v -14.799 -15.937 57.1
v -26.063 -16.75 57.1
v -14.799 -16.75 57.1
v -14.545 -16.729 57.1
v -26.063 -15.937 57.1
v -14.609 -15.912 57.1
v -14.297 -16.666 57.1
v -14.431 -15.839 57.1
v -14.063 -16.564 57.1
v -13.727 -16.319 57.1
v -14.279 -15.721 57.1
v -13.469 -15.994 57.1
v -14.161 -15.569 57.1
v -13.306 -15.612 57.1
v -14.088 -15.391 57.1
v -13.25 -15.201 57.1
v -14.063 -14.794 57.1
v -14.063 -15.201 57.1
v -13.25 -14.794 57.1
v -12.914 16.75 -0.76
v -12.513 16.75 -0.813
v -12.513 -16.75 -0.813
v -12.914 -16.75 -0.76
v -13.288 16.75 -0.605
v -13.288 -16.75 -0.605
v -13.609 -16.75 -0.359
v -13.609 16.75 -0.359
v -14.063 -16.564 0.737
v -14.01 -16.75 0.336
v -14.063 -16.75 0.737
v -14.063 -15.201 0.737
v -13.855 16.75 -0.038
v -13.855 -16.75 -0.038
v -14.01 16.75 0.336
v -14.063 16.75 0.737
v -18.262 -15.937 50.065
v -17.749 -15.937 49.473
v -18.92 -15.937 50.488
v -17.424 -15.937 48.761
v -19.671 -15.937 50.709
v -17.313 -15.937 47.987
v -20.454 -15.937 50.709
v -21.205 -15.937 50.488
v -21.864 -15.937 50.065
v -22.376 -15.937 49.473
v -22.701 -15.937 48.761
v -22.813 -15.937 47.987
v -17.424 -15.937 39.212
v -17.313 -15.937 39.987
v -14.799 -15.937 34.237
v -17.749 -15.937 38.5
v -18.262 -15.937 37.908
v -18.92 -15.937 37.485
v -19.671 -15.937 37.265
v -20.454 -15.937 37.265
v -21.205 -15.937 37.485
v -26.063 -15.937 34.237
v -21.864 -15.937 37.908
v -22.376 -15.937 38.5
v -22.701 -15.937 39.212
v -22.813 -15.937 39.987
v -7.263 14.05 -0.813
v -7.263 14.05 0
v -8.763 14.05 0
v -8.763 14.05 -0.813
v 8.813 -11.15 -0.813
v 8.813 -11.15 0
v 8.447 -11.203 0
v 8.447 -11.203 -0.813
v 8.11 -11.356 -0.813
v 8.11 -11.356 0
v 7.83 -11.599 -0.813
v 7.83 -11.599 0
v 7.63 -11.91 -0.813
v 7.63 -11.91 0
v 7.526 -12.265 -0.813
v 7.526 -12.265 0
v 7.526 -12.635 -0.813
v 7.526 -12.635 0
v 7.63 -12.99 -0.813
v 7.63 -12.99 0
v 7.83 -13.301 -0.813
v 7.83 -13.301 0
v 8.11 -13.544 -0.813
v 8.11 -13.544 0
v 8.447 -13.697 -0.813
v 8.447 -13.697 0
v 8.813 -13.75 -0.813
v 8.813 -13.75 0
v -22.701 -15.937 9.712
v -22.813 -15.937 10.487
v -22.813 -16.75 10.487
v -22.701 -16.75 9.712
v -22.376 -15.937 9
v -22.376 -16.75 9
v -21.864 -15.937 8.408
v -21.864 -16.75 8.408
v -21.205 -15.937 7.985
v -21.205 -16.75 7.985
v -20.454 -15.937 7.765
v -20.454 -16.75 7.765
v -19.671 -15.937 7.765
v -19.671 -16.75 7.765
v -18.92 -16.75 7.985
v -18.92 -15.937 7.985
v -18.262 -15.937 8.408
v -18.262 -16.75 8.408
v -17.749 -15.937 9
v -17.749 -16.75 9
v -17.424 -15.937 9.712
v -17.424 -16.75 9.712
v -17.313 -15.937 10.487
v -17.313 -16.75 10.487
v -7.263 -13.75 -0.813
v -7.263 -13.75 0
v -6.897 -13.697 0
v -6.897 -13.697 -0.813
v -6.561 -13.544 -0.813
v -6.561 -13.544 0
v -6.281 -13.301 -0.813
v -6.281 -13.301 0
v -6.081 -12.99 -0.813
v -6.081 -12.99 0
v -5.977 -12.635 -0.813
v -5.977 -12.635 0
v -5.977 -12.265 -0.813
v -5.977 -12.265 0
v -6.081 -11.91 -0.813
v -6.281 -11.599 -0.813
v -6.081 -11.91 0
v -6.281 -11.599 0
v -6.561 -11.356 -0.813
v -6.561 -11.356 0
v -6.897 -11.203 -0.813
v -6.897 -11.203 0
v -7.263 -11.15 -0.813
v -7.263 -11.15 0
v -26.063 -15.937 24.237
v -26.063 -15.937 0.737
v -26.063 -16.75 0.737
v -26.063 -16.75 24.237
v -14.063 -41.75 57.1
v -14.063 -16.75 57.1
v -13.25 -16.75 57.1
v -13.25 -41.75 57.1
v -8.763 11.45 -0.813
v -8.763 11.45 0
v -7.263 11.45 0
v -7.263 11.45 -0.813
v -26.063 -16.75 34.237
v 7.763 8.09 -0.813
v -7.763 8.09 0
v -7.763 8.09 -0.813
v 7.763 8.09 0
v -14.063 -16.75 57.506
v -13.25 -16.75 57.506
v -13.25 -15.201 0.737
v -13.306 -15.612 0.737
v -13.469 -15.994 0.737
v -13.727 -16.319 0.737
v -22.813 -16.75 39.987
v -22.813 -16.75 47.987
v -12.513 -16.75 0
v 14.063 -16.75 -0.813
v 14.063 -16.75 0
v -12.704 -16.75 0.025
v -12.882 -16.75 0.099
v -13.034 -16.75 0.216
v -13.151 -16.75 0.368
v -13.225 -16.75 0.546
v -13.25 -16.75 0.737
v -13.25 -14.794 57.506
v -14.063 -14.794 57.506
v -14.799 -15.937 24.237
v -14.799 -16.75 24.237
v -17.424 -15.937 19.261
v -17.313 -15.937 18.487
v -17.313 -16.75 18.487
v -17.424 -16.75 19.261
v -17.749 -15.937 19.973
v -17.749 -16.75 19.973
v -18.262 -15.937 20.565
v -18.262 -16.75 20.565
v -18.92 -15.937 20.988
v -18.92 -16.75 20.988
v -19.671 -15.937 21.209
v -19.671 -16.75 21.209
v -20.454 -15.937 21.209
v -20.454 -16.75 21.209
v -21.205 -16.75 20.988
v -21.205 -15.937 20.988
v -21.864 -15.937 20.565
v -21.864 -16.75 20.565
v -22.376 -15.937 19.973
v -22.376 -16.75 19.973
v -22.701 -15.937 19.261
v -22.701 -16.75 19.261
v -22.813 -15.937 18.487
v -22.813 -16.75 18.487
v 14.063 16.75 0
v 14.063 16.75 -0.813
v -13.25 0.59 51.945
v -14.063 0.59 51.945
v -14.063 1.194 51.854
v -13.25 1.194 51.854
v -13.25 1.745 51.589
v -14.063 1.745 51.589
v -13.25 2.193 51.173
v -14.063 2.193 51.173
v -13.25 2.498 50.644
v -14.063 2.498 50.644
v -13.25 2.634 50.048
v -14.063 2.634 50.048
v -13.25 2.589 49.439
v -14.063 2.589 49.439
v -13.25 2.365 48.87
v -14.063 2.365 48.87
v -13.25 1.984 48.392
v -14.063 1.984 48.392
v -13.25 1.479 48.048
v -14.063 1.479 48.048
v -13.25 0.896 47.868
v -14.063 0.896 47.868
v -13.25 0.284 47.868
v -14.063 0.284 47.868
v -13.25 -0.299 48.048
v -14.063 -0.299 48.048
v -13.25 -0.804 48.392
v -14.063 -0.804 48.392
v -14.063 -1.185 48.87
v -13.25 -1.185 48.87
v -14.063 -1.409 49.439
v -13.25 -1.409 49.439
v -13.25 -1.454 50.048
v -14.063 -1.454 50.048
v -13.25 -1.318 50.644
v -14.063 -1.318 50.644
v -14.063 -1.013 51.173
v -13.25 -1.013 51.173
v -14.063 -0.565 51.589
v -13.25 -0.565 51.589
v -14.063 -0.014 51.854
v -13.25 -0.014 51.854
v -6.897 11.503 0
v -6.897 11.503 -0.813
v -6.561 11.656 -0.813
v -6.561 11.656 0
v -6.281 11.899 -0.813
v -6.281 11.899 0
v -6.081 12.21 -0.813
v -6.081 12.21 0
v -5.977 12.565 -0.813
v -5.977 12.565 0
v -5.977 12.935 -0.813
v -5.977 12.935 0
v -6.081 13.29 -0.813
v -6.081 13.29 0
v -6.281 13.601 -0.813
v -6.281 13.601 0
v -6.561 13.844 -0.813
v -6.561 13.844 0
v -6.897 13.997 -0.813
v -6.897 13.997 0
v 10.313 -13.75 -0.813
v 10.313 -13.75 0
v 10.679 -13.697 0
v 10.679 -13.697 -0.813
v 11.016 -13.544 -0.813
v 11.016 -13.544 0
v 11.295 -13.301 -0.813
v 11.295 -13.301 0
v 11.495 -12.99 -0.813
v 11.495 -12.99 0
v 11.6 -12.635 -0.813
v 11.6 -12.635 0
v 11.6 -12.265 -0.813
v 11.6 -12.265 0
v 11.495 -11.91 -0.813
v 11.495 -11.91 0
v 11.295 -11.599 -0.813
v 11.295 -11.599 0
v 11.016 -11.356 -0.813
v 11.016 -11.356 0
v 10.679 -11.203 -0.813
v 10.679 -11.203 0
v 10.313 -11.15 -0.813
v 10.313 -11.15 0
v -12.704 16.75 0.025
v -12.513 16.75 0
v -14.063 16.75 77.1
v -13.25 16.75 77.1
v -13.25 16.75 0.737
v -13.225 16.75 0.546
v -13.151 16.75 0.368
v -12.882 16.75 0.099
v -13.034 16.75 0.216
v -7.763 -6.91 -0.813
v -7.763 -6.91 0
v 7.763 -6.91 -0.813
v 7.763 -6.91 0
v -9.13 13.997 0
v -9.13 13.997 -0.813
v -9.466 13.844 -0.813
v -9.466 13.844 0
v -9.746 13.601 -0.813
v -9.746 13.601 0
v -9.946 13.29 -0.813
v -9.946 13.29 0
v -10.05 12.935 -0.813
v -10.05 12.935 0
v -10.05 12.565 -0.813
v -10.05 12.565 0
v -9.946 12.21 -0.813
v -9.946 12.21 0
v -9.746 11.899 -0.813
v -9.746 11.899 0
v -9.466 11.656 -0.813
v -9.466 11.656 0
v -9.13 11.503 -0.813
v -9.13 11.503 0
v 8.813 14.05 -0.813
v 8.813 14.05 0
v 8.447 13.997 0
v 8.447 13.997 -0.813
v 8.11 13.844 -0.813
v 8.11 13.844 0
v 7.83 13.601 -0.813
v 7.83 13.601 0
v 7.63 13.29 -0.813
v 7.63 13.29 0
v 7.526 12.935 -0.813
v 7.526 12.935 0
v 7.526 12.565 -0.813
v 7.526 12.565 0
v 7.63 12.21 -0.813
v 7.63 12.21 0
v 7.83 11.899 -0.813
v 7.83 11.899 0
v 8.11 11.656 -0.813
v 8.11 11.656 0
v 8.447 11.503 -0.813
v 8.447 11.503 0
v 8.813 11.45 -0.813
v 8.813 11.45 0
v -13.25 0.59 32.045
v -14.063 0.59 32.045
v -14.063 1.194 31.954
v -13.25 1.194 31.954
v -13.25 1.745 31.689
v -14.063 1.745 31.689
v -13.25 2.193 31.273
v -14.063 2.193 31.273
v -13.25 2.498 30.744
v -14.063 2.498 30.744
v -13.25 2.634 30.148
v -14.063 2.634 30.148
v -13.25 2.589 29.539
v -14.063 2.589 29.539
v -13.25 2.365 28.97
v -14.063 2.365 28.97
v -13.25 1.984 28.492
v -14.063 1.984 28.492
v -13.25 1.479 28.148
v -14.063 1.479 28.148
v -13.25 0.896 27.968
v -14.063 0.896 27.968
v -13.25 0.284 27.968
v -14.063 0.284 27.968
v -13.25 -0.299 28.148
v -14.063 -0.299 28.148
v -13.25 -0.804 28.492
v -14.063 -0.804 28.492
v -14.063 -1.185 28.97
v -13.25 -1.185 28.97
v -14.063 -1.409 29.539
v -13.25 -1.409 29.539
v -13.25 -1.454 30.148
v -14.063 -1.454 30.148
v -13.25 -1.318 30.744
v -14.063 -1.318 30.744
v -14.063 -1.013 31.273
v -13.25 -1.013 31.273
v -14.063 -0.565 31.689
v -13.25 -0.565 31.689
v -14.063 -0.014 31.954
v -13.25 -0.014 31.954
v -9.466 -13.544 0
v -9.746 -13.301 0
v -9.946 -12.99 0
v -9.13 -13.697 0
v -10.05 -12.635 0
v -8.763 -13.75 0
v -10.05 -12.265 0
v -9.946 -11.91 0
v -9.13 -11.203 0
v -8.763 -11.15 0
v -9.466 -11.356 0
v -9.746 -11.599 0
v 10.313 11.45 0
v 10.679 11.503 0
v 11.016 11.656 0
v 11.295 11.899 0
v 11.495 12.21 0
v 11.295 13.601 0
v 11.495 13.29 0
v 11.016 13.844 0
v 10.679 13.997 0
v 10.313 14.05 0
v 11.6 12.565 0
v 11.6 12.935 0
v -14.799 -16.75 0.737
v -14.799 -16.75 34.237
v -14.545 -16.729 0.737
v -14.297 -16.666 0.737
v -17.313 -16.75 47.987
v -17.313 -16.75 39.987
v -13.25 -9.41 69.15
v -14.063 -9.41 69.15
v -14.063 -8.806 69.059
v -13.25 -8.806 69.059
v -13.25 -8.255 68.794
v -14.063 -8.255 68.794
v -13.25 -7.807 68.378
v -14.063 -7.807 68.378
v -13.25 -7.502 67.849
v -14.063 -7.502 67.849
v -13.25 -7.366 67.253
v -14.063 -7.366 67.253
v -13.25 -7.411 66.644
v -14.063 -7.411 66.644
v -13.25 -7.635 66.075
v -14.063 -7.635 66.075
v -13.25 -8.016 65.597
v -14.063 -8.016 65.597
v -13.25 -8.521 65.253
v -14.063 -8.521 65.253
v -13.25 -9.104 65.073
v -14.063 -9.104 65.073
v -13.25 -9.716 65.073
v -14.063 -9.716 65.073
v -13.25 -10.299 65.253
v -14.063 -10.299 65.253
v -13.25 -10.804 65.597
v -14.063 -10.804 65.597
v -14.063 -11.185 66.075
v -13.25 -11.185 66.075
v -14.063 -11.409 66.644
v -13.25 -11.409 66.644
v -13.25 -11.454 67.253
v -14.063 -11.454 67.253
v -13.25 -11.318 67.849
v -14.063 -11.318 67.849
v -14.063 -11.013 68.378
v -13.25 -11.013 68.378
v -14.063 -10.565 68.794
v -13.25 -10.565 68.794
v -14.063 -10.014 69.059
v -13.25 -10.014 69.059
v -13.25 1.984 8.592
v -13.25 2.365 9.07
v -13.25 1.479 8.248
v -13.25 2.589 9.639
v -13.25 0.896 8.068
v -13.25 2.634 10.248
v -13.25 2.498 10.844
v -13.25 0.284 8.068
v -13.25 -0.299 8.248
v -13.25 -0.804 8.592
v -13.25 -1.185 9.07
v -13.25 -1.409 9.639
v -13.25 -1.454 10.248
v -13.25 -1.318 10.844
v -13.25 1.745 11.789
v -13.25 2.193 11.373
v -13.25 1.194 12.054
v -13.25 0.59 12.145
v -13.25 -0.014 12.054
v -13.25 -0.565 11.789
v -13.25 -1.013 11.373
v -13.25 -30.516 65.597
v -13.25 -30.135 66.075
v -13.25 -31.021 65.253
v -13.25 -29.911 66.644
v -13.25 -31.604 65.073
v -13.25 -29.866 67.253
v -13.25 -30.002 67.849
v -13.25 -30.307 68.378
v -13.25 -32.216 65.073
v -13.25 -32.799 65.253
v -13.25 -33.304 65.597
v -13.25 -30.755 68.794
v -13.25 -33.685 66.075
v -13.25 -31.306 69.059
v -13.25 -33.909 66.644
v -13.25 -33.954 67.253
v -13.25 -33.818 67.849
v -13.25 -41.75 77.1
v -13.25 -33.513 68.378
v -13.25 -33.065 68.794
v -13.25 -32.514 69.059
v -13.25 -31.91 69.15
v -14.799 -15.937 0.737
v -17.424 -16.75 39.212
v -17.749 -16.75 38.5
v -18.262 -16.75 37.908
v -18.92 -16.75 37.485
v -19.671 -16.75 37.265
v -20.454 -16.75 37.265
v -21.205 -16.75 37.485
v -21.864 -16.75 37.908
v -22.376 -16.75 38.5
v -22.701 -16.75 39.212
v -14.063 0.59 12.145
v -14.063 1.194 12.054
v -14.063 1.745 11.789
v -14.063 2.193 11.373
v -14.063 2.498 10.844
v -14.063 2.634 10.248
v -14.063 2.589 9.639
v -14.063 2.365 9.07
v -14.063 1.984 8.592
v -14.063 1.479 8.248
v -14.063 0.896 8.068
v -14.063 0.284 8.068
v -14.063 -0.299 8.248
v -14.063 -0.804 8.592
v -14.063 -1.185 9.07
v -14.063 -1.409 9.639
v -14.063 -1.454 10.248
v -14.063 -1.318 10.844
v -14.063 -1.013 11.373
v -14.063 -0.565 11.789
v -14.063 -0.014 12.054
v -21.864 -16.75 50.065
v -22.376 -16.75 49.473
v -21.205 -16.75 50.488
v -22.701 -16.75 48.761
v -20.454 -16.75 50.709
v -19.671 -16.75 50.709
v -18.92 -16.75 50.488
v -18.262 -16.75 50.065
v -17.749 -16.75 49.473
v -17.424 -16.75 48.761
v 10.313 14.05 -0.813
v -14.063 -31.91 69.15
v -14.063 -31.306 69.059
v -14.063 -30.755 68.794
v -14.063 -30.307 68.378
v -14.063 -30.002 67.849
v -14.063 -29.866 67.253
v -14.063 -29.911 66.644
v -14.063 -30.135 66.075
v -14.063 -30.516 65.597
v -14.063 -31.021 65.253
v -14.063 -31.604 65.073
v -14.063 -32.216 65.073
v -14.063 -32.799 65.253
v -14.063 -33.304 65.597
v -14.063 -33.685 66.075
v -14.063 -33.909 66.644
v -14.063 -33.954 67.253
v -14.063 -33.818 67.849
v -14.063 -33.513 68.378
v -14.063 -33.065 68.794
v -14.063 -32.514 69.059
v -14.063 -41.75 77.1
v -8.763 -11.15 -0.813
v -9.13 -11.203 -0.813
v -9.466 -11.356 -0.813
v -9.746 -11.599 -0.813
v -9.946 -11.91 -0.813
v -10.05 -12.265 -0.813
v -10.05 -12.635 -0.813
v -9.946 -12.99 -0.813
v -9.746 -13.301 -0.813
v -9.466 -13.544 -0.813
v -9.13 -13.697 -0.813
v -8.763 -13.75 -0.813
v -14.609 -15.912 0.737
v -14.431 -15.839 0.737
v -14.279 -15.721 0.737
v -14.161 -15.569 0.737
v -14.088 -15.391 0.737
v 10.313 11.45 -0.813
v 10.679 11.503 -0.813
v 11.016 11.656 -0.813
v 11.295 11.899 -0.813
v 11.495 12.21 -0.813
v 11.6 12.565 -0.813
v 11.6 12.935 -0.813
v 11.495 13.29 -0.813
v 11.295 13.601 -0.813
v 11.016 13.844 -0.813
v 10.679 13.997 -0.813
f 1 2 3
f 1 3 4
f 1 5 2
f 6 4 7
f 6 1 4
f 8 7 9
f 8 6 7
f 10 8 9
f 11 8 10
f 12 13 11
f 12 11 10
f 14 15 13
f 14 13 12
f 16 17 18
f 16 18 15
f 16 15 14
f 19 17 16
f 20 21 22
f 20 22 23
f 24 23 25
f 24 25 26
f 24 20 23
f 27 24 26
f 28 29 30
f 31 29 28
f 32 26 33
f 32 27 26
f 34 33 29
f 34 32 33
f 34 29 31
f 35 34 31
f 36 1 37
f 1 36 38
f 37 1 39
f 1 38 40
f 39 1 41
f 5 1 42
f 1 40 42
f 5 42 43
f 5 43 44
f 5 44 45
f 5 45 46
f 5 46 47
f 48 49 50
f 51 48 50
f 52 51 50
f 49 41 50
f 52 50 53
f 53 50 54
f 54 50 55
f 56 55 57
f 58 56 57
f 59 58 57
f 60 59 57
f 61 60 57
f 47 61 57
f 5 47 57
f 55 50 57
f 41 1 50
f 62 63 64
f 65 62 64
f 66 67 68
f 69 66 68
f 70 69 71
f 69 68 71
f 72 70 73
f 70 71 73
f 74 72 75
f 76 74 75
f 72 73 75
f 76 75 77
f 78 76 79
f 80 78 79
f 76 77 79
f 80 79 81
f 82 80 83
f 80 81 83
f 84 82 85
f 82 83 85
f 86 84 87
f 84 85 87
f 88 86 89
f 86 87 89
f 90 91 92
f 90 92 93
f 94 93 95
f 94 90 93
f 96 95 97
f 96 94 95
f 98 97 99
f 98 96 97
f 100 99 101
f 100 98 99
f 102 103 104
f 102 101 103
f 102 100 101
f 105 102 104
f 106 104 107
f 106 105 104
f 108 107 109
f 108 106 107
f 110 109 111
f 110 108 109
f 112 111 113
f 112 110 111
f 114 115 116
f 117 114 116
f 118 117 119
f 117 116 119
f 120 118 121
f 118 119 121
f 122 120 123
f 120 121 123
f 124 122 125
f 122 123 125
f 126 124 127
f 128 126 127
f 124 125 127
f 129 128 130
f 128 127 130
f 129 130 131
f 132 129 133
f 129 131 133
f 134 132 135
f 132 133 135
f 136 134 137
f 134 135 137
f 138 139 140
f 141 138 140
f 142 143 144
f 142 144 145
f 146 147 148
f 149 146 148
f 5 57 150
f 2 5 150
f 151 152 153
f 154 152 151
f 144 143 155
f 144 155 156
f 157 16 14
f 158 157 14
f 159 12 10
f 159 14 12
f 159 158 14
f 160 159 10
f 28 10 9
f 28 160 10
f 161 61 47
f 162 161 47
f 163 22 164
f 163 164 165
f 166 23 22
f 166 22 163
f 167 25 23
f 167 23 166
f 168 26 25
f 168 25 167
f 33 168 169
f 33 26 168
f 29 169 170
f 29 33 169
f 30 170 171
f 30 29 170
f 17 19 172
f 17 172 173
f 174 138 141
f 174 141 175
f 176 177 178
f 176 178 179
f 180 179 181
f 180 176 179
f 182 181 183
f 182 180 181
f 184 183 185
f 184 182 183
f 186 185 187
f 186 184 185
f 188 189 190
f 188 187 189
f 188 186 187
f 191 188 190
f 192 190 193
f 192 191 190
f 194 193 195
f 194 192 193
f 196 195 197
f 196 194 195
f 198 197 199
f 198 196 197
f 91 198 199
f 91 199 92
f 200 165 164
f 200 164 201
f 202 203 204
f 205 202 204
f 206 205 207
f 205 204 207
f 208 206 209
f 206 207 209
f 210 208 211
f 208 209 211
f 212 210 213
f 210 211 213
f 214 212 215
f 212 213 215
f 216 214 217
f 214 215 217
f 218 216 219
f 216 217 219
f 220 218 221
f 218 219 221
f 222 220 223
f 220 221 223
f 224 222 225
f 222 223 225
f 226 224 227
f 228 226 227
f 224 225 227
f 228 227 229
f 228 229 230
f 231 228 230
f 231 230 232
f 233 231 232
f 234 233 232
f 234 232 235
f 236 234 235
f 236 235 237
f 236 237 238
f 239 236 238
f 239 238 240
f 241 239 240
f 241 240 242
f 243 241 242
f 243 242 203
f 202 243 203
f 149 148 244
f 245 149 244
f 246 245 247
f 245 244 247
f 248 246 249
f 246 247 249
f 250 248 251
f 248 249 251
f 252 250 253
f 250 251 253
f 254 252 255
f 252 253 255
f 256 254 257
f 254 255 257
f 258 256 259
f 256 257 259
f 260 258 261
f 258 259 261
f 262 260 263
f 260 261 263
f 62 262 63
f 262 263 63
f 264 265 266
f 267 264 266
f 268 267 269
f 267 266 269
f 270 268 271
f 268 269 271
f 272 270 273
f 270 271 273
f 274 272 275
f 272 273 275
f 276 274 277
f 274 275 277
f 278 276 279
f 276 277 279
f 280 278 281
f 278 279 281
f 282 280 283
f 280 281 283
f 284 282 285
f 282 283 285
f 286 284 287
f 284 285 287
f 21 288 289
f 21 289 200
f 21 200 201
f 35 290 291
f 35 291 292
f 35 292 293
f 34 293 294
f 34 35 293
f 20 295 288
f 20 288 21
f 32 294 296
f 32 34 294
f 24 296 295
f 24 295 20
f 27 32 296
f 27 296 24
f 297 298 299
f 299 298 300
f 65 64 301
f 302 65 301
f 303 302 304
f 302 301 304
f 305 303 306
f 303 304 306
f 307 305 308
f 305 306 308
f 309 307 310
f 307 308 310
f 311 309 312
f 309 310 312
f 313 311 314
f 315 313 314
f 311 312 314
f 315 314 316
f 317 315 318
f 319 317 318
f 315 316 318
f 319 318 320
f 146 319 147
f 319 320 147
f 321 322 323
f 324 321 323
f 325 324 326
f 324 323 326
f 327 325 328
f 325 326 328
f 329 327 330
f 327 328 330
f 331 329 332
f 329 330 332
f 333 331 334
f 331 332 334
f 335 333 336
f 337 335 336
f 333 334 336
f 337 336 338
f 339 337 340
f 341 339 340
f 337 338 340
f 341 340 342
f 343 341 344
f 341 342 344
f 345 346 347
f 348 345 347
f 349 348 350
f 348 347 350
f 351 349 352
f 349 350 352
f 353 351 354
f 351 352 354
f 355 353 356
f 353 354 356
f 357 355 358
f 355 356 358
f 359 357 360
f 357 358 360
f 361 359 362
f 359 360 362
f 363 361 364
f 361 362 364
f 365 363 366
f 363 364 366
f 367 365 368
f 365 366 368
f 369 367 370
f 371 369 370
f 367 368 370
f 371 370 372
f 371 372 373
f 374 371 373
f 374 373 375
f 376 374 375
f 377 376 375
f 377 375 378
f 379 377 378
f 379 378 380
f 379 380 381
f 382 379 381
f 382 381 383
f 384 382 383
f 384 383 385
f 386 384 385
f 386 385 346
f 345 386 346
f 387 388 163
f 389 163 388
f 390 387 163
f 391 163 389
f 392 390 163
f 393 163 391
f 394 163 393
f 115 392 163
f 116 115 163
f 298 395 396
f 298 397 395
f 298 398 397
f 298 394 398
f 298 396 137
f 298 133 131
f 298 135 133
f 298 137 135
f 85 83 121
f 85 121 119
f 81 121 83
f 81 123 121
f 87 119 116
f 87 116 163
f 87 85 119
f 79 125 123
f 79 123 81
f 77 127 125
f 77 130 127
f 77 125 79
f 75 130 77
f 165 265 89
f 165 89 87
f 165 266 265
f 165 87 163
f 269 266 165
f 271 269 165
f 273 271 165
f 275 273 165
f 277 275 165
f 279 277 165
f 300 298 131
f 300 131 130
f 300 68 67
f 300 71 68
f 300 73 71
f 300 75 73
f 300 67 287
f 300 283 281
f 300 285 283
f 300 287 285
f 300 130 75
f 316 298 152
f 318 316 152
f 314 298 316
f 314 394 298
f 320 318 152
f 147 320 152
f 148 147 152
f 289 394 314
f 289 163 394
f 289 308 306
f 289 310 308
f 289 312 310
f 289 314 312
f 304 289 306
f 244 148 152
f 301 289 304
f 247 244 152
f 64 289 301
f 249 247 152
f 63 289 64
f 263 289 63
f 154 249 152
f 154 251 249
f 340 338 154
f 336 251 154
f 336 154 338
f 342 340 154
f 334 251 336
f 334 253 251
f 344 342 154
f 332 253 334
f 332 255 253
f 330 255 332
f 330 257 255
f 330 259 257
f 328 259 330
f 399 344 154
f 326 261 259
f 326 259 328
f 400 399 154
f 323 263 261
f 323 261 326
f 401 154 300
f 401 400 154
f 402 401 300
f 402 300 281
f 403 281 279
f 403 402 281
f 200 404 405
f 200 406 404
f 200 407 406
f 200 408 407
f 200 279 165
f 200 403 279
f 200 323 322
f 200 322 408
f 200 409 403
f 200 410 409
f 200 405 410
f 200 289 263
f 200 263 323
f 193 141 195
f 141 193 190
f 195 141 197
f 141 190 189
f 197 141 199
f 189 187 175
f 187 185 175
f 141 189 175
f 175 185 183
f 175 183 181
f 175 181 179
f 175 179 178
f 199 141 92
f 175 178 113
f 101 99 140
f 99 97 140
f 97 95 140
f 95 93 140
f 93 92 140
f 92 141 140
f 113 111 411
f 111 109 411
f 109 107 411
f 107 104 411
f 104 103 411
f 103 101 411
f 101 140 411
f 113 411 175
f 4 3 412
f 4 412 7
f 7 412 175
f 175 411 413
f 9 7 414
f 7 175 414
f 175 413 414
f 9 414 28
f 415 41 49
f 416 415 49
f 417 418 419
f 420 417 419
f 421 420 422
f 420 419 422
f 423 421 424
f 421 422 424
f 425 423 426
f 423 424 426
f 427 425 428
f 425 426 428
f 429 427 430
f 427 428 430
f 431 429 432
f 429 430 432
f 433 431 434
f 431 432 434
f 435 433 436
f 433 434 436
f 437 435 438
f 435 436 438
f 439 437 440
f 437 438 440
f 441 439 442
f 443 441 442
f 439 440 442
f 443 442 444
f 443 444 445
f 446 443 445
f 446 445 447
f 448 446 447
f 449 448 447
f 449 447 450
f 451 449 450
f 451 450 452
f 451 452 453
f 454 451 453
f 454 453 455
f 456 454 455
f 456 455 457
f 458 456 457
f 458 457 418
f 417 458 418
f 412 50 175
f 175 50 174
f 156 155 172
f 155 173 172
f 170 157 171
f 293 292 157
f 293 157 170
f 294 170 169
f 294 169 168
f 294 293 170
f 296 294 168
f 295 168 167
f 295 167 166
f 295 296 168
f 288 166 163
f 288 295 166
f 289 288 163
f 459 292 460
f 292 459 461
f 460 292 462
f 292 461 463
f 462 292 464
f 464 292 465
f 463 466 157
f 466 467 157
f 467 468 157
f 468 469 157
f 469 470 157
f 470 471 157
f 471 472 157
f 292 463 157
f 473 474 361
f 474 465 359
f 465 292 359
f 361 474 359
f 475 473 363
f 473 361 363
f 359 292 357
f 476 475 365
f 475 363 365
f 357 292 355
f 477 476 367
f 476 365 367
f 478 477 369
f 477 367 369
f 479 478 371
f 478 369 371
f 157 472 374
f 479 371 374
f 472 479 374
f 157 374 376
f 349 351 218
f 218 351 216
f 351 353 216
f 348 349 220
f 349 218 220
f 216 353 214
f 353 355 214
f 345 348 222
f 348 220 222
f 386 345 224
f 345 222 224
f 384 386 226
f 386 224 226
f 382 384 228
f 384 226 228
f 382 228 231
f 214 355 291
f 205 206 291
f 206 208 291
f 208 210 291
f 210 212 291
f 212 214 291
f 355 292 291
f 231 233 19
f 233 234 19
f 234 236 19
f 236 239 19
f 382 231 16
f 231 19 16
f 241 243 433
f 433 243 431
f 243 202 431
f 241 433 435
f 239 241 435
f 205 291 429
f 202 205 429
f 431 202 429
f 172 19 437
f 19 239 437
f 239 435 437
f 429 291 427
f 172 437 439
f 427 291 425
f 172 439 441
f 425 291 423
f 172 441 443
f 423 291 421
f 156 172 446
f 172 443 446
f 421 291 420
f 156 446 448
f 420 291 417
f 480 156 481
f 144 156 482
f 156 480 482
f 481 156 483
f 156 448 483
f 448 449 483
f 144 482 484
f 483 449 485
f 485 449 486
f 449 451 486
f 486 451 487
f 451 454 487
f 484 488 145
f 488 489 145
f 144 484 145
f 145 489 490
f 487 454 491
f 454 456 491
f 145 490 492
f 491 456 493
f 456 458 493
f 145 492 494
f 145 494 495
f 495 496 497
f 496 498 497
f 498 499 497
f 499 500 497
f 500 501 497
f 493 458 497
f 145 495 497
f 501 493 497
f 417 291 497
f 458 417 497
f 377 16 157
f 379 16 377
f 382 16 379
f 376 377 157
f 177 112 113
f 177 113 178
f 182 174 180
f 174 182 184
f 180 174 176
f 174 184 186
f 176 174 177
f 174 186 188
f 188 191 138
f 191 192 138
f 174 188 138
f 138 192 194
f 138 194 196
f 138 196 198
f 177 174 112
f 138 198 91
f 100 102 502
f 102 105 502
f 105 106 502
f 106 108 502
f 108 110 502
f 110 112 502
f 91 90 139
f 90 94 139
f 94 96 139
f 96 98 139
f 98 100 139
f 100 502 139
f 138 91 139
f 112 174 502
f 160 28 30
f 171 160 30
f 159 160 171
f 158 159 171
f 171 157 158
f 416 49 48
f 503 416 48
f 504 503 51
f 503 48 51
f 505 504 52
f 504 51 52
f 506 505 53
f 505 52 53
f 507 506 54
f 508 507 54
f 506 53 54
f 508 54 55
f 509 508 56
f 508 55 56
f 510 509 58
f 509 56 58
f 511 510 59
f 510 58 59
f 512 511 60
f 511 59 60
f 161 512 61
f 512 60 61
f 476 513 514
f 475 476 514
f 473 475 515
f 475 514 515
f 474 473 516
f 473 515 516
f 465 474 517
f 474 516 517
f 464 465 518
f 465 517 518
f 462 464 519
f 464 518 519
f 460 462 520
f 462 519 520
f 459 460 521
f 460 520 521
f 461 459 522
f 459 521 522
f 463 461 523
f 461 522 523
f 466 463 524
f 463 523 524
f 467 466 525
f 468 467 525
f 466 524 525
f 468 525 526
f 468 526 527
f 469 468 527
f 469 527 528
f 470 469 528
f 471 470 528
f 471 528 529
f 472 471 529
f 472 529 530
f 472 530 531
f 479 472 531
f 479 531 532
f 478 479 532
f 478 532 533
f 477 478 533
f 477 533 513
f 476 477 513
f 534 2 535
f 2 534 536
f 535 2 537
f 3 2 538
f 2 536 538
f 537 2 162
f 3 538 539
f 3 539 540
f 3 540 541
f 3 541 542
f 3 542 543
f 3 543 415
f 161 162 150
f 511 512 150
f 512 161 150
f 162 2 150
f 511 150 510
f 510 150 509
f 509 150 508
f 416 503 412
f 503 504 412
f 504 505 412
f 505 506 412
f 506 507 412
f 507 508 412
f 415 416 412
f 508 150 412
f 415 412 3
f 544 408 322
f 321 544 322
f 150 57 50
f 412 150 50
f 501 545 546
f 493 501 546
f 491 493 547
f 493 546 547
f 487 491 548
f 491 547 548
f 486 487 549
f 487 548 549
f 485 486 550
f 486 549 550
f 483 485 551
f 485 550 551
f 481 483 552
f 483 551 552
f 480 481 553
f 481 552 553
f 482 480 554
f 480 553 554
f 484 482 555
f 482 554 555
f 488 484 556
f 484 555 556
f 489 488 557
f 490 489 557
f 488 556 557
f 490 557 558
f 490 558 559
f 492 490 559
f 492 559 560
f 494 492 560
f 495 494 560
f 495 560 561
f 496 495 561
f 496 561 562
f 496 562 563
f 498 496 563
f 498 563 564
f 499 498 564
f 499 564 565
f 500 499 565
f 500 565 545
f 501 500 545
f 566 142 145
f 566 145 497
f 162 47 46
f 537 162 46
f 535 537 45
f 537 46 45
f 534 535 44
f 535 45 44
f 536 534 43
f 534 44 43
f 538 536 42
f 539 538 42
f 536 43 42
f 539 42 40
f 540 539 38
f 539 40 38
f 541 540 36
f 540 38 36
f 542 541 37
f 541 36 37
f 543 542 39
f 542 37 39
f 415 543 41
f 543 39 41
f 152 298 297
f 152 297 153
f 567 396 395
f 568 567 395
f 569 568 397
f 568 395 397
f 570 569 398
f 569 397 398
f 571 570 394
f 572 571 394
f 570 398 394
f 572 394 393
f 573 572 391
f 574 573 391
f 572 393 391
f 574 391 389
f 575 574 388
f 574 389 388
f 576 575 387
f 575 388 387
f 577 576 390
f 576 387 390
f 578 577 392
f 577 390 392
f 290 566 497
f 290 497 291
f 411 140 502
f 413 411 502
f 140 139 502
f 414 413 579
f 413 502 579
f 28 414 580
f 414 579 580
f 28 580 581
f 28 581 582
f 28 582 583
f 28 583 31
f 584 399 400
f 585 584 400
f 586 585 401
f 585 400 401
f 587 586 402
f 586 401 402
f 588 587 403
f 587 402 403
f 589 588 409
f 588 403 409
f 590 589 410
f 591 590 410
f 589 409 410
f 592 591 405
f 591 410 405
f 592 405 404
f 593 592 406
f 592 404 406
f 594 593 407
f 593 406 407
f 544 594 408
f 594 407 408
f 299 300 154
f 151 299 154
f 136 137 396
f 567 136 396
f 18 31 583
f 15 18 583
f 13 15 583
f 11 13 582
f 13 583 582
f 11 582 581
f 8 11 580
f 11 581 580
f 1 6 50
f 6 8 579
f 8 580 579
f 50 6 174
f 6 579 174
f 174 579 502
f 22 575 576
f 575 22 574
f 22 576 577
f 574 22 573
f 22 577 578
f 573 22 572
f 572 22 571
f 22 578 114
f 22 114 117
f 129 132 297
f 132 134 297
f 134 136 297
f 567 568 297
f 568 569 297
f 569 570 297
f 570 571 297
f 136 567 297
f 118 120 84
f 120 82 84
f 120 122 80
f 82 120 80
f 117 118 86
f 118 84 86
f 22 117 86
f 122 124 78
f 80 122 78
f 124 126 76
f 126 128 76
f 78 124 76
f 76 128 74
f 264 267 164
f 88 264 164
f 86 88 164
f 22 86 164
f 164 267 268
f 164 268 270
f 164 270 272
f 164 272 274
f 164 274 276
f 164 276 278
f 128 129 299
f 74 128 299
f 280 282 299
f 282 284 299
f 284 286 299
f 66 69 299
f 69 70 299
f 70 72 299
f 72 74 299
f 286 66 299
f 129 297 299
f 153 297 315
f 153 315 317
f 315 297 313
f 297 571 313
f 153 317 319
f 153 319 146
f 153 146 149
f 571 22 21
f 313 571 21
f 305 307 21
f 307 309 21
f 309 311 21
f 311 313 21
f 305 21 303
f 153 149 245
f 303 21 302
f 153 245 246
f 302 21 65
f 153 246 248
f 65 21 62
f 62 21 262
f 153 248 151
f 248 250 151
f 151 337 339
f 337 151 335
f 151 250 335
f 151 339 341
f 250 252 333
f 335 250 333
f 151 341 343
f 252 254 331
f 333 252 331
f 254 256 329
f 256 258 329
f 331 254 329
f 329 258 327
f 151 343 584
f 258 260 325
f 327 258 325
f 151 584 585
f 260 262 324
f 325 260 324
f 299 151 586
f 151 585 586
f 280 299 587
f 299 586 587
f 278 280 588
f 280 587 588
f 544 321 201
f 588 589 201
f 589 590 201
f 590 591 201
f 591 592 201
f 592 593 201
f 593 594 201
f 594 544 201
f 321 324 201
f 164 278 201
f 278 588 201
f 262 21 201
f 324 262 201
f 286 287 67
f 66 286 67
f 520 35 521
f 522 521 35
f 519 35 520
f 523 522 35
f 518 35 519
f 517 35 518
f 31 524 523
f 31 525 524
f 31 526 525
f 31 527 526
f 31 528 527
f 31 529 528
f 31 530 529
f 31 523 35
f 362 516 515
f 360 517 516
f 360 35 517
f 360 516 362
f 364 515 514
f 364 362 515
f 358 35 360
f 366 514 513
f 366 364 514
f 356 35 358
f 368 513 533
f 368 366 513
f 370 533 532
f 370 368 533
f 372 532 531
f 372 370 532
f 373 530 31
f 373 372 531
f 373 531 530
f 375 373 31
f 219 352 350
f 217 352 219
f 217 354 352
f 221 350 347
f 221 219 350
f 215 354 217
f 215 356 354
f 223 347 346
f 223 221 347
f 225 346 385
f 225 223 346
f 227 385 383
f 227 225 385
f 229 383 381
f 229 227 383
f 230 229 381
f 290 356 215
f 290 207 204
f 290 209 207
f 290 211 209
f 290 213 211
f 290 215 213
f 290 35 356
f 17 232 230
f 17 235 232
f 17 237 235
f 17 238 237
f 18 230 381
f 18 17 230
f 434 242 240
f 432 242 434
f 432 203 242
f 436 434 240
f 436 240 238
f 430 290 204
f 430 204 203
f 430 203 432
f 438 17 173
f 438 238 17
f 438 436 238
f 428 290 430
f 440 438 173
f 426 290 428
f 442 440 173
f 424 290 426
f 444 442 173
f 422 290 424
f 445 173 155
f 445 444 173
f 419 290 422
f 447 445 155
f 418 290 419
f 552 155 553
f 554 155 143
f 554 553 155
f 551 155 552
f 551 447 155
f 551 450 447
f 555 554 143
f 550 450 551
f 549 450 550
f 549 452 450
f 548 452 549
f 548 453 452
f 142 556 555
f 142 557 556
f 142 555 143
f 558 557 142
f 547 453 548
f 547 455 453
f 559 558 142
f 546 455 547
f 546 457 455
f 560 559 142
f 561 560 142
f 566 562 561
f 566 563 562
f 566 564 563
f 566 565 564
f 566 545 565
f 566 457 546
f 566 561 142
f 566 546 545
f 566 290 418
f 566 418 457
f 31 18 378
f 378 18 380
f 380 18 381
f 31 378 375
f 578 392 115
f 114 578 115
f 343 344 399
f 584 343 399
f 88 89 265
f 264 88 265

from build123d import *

# Parameters (mm, degrees)
SKETCH1_W                    = 28.1256
SKETCH1_H                    = 33.5
SKETCH1_W_2                  = 15.5256
SKETCH1_H_2                  = 15
BASE_FLANGE2_DEPTH           = 0.8128
EDGE_FLANGE3_STRIP_W         = 4.7244
EDGE_FLANGE3_STRIP_H         = 0.8128
EDGE_FLANGE3_STRIP_CUT_DEPTH = 33.5
EDGE_FLANGE3_DEPTH           = 33.5
EDGE_FLANGE3_FLAT_DEPTH      = 0.8128
EDGE_FLANGE4_START           = 0.7366
EDGE_FLANGE4_DEPTH           = 56.7698
EDGE_FLANGE4_START_2         = 57.1
EDGE_FLANGE4_2_DEPTH         = 0.4064
EDGE_FLANGE4_3_DEPTH         = 56.3634
CUT_EXTRUDE1_REACH           = 94.079
SKETCH22_R                   = 2.05
CUT_EXTRUDE2_REACH           = 89.705
SKETCH23_W                   = 11.2634
SKETCH23_H                   = 10
CUT_EXTRUDE3_REACH           = 93.47


# Read off the part's stored shape, not the designer's step: Edge-Flange4
# Sheet-metal steps are written as plain solids
with BuildPart() as part:
    # Sketch1 → Base-Flange2 (new body)
    with BuildSketch(Plane.XY):
        Rectangle(SKETCH1_W, SKETCH1_H)
        with Locations((0, 0.59)):
            Rectangle(SKETCH1_W_2, SKETCH1_H_2, mode=Mode.SUBTRACT)
    extrude(amount=-BASE_FLANGE2_DEPTH)

    # Edge-Flange3 strip (across the edge) → Edge-Flange3 strip cut (cut)
    with BuildSketch(Plane(origin=(-14.0628, 16.75, 0), x_dir=(1, 0, 0), z_dir=(0, -1, 0))):
        with Locations((-0.8128, -0.4064)):
            Rectangle(EDGE_FLANGE3_STRIP_W, EDGE_FLANGE3_STRIP_H)
    extrude(amount=EDGE_FLANGE3_STRIP_CUT_DEPTH, mode=Mode.SUBTRACT)

    # Edge-Flange3 bend section (across the edge) → Edge-Flange3 (add)
    with BuildSketch(Plane(origin=(-14.0628, 16.75, 0), x_dir=(1, 0, 0), z_dir=(0, -1, 0))):
        with BuildLine():
            Line((0, 0.7366), (0.8128, 0.7366))
            ThreePointArc((0.8128, 0.7366), (1.028545145, 0.215745145), (1.5494, 0))
            Line((1.5494, 0), (1.5494, -0.8128))
            ThreePointArc((1.5494, -0.8128), (0.453808753, -0.358991247), (0, 0.7366))
        make_face()
    extrude(amount=EDGE_FLANGE3_DEPTH)

    # Edge-Flange3 profile (on flange) → Edge-Flange3 flat (add)
    with BuildSketch(Plane(origin=(-14.0628, 0, 0), x_dir=(0, -1, 0), z_dir=(-1, 0, 0))):
        Polygon((-16.75, 0.7366), (16.75, 0.7366), (16.75, 57.1), (41.75, 57.1), (41.75, 77.1), (-16.75, 77.1), align=None)
    extrude(amount=-EDGE_FLANGE3_FLAT_DEPTH)

    # Edge-Flange4 outline → Edge-Flange4 (cut)
    with BuildSketch(Plane.XY.offset(EDGE_FLANGE4_START)):
        with BuildLine():
            ThreePointArc((-13.25, -15.2006), (-13.468624211, -15.994121367), (-14.0628, -16.563707039))
            Line((-14.0628, -16.563707039), (-14.0628, -16.75))
            Line((-14.0628, -16.75), (-13.25, -16.75))
            Line((-13.25, -16.75), (-13.25, -15.2006))
        make_face()
    extrude(amount=EDGE_FLANGE4_DEPTH, mode=Mode.SUBTRACT)

    # Edge-Flange4 2 outline → Edge-Flange4 2 (cut)
    with BuildSketch(Plane.XY.offset(EDGE_FLANGE4_START_2)):
        with BuildLine():
            Line((-14.0628, -14.7942), (-14.0628, -16.563707039))
            ThreePointArc((-14.0628, -16.563707039), (-13.468624211, -15.994121367), (-13.25, -15.2006))
            Line((-13.25, -15.2006), (-13.25, -14.7942))
            Line((-13.25, -14.7942), (-14.0628, -14.7942))
        make_face()
    extrude(amount=EDGE_FLANGE4_2_DEPTH, mode=Mode.SUBTRACT)

    # Edge-Flange4 3 outline → Edge-Flange4 3 (add)
    with BuildSketch(Plane.XY.offset(EDGE_FLANGE4_START)):
        with BuildLine():
            Line((-26.0628, -16.75), (-14.7994, -16.75))
            ThreePointArc((-14.7994, -16.75), (-14.419503755, -16.702704924), (-14.0628, -16.563707039))
            Line((-14.0628, -16.563707039), (-14.0628, -15.2006))
            ThreePointArc((-14.0628, -15.2006), (-14.278545145, -15.721454855), (-14.7994, -15.9372))
            Line((-14.7994, -15.9372), (-26.0628, -15.9372))
            Line((-26.0628, -15.9372), (-26.0628, -16.75))
        make_face()
    extrude(amount=EDGE_FLANGE4_3_DEPTH)

    # Sketch22 → Cut-Extrude1 (cut, up to next)
    with BuildSketch(Plane.ZY.offset(14.0628), mode=Mode.PRIVATE) as cut_extrude1_sk1:
        with Locations((67.1, -31.91)):
            Circle(SKETCH22_R)
    cut_extrude1_tool1 = extrude(cut_extrude1_sk1.sketch, amount=-CUT_EXTRUDE1_REACH, mode=Mode.PRIVATE) & part.part
    # Sketch22 → Cut-Extrude1 (cut, up to next)
    with BuildSketch(Plane.ZY.offset(14.0628), mode=Mode.PRIVATE) as cut_extrude1_sk2:
        with Locations((67.1, -9.41)):
            Circle(SKETCH22_R)
    cut_extrude1_tool2 = extrude(cut_extrude1_sk2.sketch, amount=-CUT_EXTRUDE1_REACH, mode=Mode.PRIVATE) & part.part
    # Sketch22 → Cut-Extrude1 (cut, up to next)
    with BuildSketch(Plane.ZY.offset(14.0628), mode=Mode.PRIVATE) as cut_extrude1_sk3:
        with Locations((49.895058849, 0.59)):
            Circle(SKETCH22_R)
    cut_extrude1_tool3 = extrude(cut_extrude1_sk3.sketch, amount=-CUT_EXTRUDE1_REACH, mode=Mode.PRIVATE) & part.part
    # Sketch22 → Cut-Extrude1 (cut, up to next)
    with BuildSketch(Plane.ZY.offset(14.0628), mode=Mode.PRIVATE) as cut_extrude1_sk4:
        with Locations((29.995058849, 0.59)):
            Circle(SKETCH22_R)
    cut_extrude1_tool4 = extrude(cut_extrude1_sk4.sketch, amount=-CUT_EXTRUDE1_REACH, mode=Mode.PRIVATE) & part.part
    # Sketch22 → Cut-Extrude1 (cut, up to next)
    with BuildSketch(Plane.ZY.offset(14.0628), mode=Mode.PRIVATE) as cut_extrude1_sk5:
        with Locations((10.095058849, 0.59)):
            Circle(SKETCH22_R)
    cut_extrude1_tool5 = extrude(cut_extrude1_sk5.sketch, amount=-CUT_EXTRUDE1_REACH, mode=Mode.PRIVATE) & part.part
    add(cut_extrude1_tool1.solids().sort_by_distance((-14.0628, -31.91, 67.1))[0], mode=Mode.SUBTRACT)
    add(cut_extrude1_tool2.solids().sort_by_distance((-14.0628, -9.41, 67.1))[0], mode=Mode.SUBTRACT)
    add(cut_extrude1_tool3.solids().sort_by_distance((-14.0628, 0.59, 49.895059))[0], mode=Mode.SUBTRACT)
    add(cut_extrude1_tool4.solids().sort_by_distance((-14.0628, 0.59, 29.995059))[0], mode=Mode.SUBTRACT)
    add(cut_extrude1_tool5.solids().sort_by_distance((-14.0628, 0.59, 10.095059))[0], mode=Mode.SUBTRACT)

    # Sketch23 → Cut-Extrude2 (cut, up to next)
    with BuildSketch(Plane(origin=(0, -15.9372, 0), x_dir=(1, 0, 0), z_dir=(0, 1, 0)), mode=Mode.PRIVATE) as cut_extrude2_sk1:
        with Locations((-20.4311, -29.2366)):
            Rectangle(SKETCH23_W, SKETCH23_H)
    cut_extrude2_tool1 = extrude(cut_extrude2_sk1.sketch, amount=-CUT_EXTRUDE2_REACH, mode=Mode.PRIVATE) & part.part
    # Sketch23 → Cut-Extrude2 (cut, up to next)
    with BuildSketch(Plane(origin=(0, -15.9372, 0), x_dir=(1, 0, 0), z_dir=(0, 1, 0)), mode=Mode.PRIVATE) as cut_extrude2_sk2:
        with BuildLine():
            Line((-22.8128, -18.4866), (-22.8128, -10.4866))
            ThreePointArc((-22.8128, -10.4866), (-20.0628, -7.7366), (-17.3128, -10.4866))
            Line((-17.3128, -10.4866), (-17.3128, -18.4866))
            ThreePointArc((-17.3128, -18.4866), (-20.0628, -21.2366), (-22.8128, -18.4866))
        make_face()
    cut_extrude2_tool2 = extrude(cut_extrude2_sk2.sketch, amount=-CUT_EXTRUDE2_REACH, mode=Mode.PRIVATE) & part.part
    # Sketch23 → Cut-Extrude2 (cut, up to next)
    with BuildSketch(Plane(origin=(0, -15.9372, 0), x_dir=(1, 0, 0), z_dir=(0, 1, 0)), mode=Mode.PRIVATE) as cut_extrude2_sk3:
        with BuildLine():
            Line((-22.8128, -39.9866), (-22.8128, -47.9866))
            ThreePointArc((-22.8128, -47.9866), (-20.0628, -50.7366), (-17.3128, -47.9866))
            Line((-17.3128, -47.9866), (-17.3128, -39.9866))
            ThreePointArc((-17.3128, -39.9866), (-20.0628, -37.2366), (-22.8128, -39.9866))
        make_face()
    cut_extrude2_tool3 = extrude(cut_extrude2_sk3.sketch, amount=-CUT_EXTRUDE2_REACH, mode=Mode.PRIVATE) & part.part
    add(cut_extrude2_tool1.solids().sort_by_distance((-20.4311, -15.9372, 29.2366))[0], mode=Mode.SUBTRACT)
    add(cut_extrude2_tool2.solids().sort_by_distance((-20.0628, -15.9372, 14.4866))[0], mode=Mode.SUBTRACT)
    add(cut_extrude2_tool3.solids().sort_by_distance((-20.0628, -15.9372, 43.9866))[0], mode=Mode.SUBTRACT)

    # Sketch26 → Cut-Extrude3 (cut, up to next)
    with BuildSketch(Plane.XY, mode=Mode.PRIVATE) as cut_extrude3_sk1:
        with BuildLine():
            Line((8.8128, -13.75), (10.3128, -13.75))
            ThreePointArc((10.3128, -13.75), (11.6128, -12.45), (10.3128, -11.15))
            Line((10.3128, -11.15), (8.8128, -11.15))
            ThreePointArc((8.8128, -11.15), (7.5128, -12.45), (8.8128, -13.75))
        make_face()
    cut_extrude3_tool1 = extrude(cut_extrude3_sk1.sketch, amount=-CUT_EXTRUDE3_REACH, mode=Mode.PRIVATE) & part.part
    # Sketch26 → Cut-Extrude3 (cut, up to next)
    with BuildSketch(Plane.XY, mode=Mode.PRIVATE) as cut_extrude3_sk2:
        with BuildLine():
            Line((-8.7634, -13.75), (-7.2634, -13.75))
            ThreePointArc((-7.2634, -13.75), (-5.9634, -12.45), (-7.2634, -11.15))
            Line((-7.2634, -11.15), (-8.7634, -11.15))
            ThreePointArc((-8.7634, -11.15), (-10.0634, -12.45), (-8.7634, -13.75))
        make_face()
    cut_extrude3_tool2 = extrude(cut_extrude3_sk2.sketch, amount=-CUT_EXTRUDE3_REACH, mode=Mode.PRIVATE) & part.part
    # Sketch26 → Cut-Extrude3 (cut, up to next)
    with BuildSketch(Plane.XY, mode=Mode.PRIVATE) as cut_extrude3_sk3:
        with BuildLine():
            Line((8.8128, 11.45), (10.3128, 11.45))
            ThreePointArc((10.3128, 11.45), (11.6128, 12.75), (10.3128, 14.05))
            Line((10.3128, 14.05), (8.8128, 14.05))
            ThreePointArc((8.8128, 14.05), (7.5128, 12.75), (8.8128, 11.45))
        make_face()
    cut_extrude3_tool3 = extrude(cut_extrude3_sk3.sketch, amount=-CUT_EXTRUDE3_REACH, mode=Mode.PRIVATE) & part.part
    # Sketch26 → Cut-Extrude3 (cut, up to next)
    with BuildSketch(Plane.XY, mode=Mode.PRIVATE) as cut_extrude3_sk4:
        with BuildLine():
            Line((-8.7634, 11.45), (-7.2634, 11.45))
            ThreePointArc((-7.2634, 11.45), (-5.9634, 12.75), (-7.2634, 14.05))
            Line((-7.2634, 14.05), (-8.7634, 14.05))
            ThreePointArc((-8.7634, 14.05), (-10.0634, 12.75), (-8.7634, 11.45))
        make_face()
    cut_extrude3_tool4 = extrude(cut_extrude3_sk4.sketch, amount=-CUT_EXTRUDE3_REACH, mode=Mode.PRIVATE) & part.part
    add(cut_extrude3_tool1.solids().sort_by_distance((9.5628, -12.45, 0))[0], mode=Mode.SUBTRACT)
    add(cut_extrude3_tool2.solids().sort_by_distance((-8.0134, -12.45, 0))[0], mode=Mode.SUBTRACT)
    add(cut_extrude3_tool3.solids().sort_by_distance((9.5628, 12.75, 0))[0], mode=Mode.SUBTRACT)
    add(cut_extrude3_tool4.solids().sort_by_distance((-8.0134, 12.75, 0))[0], mode=Mode.SUBTRACT)


solid = part.part
